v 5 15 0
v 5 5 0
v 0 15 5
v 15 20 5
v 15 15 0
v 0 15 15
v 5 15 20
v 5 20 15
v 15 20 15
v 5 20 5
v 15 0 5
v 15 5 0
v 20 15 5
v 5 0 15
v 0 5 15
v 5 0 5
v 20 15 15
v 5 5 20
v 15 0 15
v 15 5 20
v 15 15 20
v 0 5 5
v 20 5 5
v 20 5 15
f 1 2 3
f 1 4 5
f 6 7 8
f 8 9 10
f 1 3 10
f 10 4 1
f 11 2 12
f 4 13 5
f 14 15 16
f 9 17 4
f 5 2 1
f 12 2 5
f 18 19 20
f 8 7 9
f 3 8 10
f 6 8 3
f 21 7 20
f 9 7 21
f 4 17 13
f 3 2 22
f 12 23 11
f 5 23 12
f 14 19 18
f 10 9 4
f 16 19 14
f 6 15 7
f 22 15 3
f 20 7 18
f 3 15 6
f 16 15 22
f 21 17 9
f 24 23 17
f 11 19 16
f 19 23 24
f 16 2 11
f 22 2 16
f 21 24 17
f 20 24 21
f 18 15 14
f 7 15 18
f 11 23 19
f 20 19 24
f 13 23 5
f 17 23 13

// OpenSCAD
minkowski() {
  translate([5,5,5]) cube([10,10,10]);
    for(m=[0,1]) mirror([0,0,m]) cylinder(r1=5,r2=0,$fn=4,h=5);
}
module drum_spinner() {
cube([200,140,40]);
translate([10,160,20]) rotate([0,90,0]) drum();
}
module drum() {
  cylinder(d=38,h=180,$fn=30);
}
